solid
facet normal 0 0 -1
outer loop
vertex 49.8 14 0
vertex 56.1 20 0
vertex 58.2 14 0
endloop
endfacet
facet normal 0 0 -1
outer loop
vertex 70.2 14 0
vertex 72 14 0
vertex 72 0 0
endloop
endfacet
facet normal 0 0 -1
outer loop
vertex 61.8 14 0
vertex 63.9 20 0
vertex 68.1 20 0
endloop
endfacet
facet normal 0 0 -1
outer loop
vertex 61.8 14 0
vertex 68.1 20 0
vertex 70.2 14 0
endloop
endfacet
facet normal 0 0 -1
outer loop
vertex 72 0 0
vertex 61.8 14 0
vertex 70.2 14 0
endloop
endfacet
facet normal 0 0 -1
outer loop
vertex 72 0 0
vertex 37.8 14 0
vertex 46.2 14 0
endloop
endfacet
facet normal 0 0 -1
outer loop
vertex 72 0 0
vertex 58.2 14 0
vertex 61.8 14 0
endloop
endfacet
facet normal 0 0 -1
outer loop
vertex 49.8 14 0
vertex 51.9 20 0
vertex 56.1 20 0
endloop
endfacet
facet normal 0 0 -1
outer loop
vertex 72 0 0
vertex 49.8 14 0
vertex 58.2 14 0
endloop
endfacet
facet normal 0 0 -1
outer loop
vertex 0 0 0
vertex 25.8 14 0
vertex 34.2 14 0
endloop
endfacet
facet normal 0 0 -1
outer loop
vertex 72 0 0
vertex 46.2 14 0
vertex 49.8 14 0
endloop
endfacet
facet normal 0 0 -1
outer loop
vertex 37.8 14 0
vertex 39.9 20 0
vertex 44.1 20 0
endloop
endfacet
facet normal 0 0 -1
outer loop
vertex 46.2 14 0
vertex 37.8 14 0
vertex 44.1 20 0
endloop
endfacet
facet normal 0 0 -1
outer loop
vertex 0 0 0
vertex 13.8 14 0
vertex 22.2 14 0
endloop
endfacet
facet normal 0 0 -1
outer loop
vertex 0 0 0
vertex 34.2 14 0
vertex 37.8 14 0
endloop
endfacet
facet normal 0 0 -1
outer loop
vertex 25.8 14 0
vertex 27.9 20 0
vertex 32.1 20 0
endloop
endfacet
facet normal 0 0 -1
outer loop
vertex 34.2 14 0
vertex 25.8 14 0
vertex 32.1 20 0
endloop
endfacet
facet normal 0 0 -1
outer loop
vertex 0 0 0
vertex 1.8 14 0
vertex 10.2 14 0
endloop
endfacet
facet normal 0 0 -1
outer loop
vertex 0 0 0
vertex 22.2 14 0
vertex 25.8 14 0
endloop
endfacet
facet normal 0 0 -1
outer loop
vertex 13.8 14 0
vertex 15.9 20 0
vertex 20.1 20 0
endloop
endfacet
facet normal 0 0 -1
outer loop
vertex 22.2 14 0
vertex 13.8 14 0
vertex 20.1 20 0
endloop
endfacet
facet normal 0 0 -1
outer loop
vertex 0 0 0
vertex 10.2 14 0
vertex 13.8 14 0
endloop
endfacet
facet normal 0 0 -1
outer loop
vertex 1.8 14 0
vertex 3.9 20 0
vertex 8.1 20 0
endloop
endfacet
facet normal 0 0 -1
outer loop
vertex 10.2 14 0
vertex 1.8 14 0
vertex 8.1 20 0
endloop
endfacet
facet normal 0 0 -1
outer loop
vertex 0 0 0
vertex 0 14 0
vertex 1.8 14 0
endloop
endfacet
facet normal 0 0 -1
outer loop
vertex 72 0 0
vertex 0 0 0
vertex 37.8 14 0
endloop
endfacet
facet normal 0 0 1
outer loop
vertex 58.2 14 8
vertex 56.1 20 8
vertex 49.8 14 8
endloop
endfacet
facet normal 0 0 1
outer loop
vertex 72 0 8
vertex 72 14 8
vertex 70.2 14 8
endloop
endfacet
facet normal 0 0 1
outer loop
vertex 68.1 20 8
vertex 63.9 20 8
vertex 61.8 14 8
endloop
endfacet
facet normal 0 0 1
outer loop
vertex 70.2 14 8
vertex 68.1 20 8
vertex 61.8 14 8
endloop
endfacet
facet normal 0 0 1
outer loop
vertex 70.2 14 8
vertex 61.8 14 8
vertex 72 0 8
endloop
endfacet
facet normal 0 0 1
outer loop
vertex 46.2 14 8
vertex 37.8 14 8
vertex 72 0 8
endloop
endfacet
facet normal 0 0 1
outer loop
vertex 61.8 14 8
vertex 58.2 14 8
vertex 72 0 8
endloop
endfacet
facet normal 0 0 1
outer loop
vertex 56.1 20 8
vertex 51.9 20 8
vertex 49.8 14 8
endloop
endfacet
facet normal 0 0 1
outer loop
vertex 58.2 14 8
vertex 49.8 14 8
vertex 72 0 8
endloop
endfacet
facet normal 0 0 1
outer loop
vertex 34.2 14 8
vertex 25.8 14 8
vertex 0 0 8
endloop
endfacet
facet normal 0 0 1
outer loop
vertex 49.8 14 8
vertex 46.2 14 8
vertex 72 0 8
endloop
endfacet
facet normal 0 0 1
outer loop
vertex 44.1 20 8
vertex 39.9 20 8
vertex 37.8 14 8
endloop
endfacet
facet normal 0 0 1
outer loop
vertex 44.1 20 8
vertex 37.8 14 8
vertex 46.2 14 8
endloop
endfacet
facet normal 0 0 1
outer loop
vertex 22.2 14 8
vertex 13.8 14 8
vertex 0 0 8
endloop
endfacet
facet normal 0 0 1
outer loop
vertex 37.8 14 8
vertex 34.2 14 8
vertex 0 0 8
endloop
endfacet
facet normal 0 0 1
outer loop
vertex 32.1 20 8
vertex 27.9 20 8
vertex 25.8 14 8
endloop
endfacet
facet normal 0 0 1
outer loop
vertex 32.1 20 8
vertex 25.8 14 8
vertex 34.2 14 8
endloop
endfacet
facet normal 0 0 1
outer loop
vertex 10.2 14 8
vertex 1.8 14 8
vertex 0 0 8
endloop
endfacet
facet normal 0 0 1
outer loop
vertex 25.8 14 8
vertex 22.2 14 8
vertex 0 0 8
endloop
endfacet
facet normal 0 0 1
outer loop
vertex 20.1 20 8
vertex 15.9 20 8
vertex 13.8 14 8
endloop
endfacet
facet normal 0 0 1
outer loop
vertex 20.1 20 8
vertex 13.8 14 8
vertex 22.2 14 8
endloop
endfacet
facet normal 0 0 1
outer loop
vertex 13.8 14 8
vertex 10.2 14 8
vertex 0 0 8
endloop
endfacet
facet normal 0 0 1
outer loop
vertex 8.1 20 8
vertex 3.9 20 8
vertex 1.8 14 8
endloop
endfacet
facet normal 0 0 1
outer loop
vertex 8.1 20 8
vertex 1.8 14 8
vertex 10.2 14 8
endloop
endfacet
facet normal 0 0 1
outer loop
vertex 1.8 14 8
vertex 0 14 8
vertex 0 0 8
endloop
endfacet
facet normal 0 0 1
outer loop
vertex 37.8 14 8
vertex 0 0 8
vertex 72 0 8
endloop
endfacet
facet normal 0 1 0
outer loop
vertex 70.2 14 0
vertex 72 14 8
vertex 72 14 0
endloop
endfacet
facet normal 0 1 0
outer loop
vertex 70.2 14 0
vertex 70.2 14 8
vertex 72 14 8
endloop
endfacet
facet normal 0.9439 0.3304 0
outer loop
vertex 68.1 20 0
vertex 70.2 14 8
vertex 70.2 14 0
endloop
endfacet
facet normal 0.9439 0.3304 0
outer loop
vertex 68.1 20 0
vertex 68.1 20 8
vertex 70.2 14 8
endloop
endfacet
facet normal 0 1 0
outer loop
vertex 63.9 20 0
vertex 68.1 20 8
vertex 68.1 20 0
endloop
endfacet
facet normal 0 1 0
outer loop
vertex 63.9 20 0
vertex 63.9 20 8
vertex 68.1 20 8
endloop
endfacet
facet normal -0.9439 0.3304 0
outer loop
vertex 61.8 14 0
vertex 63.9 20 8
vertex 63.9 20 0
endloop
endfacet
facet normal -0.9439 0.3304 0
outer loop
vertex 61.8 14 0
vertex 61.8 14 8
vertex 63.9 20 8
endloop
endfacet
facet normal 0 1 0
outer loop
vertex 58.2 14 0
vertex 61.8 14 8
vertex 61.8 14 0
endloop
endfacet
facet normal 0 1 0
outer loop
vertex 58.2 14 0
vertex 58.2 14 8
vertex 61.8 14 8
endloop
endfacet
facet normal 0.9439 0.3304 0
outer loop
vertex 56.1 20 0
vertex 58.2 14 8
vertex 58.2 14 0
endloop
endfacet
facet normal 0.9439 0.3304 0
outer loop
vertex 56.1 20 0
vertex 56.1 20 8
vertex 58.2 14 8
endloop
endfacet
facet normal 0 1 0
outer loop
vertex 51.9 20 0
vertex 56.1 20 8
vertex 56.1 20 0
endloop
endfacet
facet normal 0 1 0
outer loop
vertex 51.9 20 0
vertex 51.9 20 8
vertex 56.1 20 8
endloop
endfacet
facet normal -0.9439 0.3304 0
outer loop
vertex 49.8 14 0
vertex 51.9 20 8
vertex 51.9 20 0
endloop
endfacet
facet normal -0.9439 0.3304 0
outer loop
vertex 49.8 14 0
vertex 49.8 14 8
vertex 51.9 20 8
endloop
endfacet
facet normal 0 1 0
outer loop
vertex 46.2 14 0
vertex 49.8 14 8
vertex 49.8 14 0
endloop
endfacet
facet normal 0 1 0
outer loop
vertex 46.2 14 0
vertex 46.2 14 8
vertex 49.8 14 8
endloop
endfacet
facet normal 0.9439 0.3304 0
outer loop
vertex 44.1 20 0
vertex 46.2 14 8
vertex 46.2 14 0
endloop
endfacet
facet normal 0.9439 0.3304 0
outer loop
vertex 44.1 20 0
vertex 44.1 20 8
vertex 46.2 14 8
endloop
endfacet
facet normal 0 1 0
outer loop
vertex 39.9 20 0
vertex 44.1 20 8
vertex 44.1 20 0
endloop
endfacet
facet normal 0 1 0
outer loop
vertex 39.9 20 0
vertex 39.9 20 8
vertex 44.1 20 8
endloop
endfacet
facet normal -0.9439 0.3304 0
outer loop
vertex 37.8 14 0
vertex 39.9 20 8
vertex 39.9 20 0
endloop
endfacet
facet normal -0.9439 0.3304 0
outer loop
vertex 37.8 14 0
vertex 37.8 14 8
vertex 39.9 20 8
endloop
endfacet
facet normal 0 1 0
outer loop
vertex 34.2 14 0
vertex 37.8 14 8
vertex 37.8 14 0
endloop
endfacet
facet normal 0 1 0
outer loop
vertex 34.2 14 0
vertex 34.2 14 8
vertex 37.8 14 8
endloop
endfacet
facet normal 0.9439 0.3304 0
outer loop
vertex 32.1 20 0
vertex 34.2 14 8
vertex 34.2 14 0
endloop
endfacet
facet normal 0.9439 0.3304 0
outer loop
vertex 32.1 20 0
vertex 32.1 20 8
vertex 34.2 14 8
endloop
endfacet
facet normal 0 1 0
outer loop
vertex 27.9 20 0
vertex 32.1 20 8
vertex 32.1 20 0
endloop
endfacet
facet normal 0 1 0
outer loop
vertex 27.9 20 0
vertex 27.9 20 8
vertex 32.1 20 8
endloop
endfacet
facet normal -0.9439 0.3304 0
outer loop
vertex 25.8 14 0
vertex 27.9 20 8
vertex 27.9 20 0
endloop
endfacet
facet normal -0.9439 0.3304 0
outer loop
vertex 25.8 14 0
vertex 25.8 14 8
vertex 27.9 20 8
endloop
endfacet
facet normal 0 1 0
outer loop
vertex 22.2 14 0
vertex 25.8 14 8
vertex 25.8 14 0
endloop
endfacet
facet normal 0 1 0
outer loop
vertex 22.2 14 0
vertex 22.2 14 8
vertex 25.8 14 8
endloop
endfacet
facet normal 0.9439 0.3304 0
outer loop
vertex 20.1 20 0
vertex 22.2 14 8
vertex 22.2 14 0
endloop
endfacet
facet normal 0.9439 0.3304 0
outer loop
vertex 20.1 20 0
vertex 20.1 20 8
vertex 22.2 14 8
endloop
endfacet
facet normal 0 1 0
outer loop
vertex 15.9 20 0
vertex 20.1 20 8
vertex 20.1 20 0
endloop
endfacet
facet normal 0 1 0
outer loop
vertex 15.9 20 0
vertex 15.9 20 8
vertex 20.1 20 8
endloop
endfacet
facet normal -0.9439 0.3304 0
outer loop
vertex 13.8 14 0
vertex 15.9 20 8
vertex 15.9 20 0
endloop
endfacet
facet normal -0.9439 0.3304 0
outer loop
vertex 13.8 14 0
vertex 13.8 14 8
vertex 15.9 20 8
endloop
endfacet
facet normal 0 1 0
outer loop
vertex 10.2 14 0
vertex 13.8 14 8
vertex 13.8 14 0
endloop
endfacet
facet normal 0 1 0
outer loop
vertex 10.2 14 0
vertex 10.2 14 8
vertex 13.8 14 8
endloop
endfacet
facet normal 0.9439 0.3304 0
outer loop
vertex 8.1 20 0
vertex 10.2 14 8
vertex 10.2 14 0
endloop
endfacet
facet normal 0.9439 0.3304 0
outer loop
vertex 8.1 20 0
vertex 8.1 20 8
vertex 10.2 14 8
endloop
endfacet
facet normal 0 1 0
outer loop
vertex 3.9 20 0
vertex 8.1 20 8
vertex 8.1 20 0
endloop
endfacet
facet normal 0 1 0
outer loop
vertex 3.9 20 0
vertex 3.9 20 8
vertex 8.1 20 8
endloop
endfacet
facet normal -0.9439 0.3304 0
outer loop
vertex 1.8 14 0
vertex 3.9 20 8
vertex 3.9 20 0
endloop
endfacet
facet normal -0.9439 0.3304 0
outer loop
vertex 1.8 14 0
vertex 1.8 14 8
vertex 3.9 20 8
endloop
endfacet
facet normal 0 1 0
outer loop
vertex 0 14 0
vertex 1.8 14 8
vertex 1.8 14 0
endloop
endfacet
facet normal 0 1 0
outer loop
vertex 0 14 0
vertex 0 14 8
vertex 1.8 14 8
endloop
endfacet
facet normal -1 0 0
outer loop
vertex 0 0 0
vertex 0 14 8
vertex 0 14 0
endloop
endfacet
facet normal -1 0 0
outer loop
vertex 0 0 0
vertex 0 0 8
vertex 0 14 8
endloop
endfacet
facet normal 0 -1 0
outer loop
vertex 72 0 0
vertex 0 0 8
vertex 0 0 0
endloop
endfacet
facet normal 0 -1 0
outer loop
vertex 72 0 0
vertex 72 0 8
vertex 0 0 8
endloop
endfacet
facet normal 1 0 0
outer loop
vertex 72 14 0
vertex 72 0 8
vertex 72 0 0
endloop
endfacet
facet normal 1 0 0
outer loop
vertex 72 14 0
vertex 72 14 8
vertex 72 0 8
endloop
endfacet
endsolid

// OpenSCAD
$fn = 32;

// ----------------------------------------------------------------------
// Gear rack: 6 teeth, pitch 12 mm
// ----------------------------------------------------------------------

// --- parameters (mm) ---
teeth = 6;                // number of teeth
pitch = 12;               // tooth pitch, X
root_w = 8.4;             // tooth width at the root
tip_w = 4.2;              // tooth width at the tip
base_h = 14;              // rack body height, Y
tooth_h = 6;              // tooth height above the body
plate_t = 8;              // rack width, Z (extrusion height)
fit_tol = 0.1;            // declared fit tolerance (prompt contract)
free_tol = 0.5;           // declared free tolerance (prompt contract)

rack_l = teeth * pitch;  // overall length
total_h = base_h + tooth_h;  // overall height

profile = [[0, 0], [72, 0], [72, 14], [70.2, 14], [68.1, 20], [63.9, 20], [61.8, 14], [58.2, 14], [56.1, 20], [51.9, 20], [49.8, 14], [46.2, 14], [44.1, 20], [39.9, 20], [37.8, 14], [34.2, 14], [32.1, 20], [27.9, 20], [25.8, 14], [22.2, 14], [20.1, 20], [15.9, 20], [13.8, 14], [10.2, 14], [8.1, 20], [3.9, 20], [1.8, 14], [0, 14]];  // primary outline, 28 points, counter clockwise

// --- the one profile operation ---
linear_extrude(height = plate_t) polygon(points = profile);
